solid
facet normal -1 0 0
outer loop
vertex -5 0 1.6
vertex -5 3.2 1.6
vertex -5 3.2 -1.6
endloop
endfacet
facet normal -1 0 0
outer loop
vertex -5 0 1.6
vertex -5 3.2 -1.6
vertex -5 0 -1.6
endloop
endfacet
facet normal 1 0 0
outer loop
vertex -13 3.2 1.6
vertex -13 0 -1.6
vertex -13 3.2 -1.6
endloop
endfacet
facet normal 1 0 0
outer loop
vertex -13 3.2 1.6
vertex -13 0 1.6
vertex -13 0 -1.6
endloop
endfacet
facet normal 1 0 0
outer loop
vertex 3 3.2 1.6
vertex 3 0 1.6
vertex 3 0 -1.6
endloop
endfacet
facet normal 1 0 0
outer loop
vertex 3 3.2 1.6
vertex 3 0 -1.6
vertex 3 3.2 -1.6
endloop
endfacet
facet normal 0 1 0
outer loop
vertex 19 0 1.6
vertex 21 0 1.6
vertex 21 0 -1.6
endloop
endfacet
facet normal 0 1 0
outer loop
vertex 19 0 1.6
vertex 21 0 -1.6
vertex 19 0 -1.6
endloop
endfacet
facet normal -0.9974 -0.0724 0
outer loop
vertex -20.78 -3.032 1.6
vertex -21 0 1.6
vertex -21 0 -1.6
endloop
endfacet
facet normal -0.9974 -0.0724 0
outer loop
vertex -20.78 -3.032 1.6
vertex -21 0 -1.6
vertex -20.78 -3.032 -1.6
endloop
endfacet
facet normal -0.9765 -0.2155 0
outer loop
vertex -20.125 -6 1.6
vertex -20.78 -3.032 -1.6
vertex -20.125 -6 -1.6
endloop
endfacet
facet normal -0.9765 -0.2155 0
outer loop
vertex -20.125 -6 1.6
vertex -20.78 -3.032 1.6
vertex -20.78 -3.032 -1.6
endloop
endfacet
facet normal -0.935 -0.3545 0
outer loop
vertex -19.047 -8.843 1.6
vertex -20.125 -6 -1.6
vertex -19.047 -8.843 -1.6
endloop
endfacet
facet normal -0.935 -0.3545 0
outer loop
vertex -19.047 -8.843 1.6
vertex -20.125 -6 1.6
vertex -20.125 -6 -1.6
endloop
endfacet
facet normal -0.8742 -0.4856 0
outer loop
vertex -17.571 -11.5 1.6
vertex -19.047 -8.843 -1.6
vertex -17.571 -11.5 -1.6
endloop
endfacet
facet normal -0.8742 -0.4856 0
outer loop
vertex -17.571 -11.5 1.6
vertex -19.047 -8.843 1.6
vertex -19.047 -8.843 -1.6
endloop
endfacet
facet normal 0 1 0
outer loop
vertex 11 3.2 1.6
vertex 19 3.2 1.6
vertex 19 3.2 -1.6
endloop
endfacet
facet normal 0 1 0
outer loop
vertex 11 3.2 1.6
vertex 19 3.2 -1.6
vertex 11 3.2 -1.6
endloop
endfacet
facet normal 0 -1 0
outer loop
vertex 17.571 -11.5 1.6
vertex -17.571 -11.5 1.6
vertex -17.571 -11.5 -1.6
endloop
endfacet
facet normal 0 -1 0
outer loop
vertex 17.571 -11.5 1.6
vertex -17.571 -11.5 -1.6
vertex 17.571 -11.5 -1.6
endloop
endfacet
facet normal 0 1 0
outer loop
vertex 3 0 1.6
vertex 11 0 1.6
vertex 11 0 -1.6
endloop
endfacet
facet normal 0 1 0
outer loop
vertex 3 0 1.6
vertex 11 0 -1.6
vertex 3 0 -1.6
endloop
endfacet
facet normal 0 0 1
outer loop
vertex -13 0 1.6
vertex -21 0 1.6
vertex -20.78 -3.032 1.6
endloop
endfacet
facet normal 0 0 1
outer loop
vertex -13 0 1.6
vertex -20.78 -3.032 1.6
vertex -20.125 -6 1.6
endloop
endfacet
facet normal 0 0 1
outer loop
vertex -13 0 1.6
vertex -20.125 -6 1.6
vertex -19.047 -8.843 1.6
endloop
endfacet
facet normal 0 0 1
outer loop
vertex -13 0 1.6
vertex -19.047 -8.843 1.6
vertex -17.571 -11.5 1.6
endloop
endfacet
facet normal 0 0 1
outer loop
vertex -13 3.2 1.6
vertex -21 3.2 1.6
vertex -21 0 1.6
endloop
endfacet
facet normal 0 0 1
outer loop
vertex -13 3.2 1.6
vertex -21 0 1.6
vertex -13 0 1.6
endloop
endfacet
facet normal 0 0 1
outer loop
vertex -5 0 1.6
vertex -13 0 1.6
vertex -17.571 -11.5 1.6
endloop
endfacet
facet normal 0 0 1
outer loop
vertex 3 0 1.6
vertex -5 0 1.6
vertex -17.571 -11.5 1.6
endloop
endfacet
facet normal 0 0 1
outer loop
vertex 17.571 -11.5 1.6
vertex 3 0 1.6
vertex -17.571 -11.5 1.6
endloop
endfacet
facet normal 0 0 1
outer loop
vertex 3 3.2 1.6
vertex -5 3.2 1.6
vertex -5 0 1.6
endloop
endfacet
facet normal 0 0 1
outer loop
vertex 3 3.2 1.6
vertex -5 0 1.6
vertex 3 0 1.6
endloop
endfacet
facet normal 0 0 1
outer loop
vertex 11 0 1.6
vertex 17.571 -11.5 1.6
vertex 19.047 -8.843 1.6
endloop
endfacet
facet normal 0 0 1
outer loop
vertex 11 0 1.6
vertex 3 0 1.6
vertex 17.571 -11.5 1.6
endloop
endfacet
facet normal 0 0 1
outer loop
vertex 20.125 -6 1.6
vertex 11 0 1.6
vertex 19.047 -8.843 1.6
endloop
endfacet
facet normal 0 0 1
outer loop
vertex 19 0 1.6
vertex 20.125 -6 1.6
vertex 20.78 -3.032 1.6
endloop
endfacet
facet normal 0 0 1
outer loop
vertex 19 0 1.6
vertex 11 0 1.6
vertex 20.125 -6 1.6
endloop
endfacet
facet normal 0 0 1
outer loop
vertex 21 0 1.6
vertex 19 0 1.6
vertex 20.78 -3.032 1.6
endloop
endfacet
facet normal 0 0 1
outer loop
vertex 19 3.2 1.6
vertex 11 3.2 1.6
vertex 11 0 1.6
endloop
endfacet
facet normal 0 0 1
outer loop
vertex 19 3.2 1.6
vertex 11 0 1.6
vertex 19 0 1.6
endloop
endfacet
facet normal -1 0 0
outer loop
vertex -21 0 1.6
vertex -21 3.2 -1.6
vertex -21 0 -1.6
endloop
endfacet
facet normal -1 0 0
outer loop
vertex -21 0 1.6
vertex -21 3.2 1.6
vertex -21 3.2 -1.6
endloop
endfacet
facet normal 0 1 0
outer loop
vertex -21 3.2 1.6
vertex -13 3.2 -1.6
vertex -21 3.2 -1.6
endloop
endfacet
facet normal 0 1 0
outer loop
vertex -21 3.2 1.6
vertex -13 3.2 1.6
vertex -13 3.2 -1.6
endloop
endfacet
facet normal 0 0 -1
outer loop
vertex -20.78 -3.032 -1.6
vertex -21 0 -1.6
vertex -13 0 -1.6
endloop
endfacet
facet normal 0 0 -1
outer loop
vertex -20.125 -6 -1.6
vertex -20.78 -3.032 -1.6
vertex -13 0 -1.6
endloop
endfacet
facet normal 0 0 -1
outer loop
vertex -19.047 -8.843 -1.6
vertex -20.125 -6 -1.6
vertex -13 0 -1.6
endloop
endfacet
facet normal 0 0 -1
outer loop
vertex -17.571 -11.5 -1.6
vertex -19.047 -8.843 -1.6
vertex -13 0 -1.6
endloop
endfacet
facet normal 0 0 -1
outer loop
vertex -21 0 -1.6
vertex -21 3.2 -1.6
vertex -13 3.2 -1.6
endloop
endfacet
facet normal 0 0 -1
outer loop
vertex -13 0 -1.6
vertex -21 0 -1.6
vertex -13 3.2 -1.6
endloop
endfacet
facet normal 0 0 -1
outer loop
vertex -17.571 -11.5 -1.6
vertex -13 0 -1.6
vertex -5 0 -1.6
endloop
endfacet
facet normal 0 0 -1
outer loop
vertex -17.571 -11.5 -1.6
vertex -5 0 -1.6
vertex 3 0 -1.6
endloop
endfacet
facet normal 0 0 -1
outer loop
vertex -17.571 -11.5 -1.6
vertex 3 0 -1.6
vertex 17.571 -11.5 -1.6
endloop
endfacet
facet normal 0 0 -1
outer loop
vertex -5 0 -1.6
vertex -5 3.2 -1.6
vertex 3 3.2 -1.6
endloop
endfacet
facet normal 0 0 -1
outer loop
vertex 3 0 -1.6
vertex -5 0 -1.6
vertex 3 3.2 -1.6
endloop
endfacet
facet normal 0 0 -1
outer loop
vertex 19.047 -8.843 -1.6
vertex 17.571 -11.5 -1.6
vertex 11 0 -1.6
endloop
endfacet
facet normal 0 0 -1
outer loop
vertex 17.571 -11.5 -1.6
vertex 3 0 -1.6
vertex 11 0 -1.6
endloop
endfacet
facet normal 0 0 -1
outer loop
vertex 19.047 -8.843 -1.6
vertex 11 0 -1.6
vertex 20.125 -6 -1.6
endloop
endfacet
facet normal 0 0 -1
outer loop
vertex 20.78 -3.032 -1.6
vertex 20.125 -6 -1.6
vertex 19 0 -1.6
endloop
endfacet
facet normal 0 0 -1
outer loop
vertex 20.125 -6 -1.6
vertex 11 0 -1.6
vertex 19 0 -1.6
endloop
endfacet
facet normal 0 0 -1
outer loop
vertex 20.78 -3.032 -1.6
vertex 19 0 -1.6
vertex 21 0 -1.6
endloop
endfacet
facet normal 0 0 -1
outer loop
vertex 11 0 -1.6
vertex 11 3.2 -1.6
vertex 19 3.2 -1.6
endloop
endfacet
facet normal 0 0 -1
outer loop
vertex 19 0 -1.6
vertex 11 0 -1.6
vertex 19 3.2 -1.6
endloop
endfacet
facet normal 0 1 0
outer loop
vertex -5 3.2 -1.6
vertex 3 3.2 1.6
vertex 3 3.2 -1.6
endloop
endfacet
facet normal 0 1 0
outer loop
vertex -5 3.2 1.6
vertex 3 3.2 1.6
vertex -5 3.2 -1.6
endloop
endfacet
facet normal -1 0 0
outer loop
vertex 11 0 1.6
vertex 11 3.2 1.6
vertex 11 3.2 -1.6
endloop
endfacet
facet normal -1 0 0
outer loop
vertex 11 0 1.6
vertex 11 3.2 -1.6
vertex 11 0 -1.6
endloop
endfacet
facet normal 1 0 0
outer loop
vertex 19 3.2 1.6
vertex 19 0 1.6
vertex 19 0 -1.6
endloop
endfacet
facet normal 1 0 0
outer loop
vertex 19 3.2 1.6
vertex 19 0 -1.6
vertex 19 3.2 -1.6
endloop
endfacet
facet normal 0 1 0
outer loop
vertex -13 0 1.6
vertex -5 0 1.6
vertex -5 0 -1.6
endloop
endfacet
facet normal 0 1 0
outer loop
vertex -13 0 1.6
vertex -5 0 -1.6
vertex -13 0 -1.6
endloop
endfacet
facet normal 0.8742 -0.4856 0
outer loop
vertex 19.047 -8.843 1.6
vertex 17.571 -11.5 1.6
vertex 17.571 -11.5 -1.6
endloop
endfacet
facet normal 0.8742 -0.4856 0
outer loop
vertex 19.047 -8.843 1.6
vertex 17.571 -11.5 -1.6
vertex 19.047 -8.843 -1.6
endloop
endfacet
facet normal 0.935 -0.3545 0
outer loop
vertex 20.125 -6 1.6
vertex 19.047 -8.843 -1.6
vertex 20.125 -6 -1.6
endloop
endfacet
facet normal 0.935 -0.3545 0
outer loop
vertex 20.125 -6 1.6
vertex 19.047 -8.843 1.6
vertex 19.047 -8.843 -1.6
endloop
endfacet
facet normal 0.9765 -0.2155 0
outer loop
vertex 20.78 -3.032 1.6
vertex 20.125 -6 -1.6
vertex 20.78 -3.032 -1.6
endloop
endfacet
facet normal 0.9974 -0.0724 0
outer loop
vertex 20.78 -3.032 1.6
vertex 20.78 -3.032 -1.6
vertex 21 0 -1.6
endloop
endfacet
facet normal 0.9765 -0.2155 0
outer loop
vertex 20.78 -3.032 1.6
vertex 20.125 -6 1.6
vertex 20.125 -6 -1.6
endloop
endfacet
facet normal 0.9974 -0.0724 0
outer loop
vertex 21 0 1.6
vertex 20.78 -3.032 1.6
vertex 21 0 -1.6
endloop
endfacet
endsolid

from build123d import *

# Parameters (mm, degrees)
F1_DEPTH = 1.6


# Not quite as in the source:
# - a feature names something its author has since deleted; it is built from what else it names


with BuildPart() as f1:
    # F0 (on Top) → F1 (new body, symmetric)
    with BuildSketch(Plane.XY):
        with BuildLine():
            Line((-21, 3.2), (-21, 0))
            ThreePointArc((-21, 0), (-20.1245739235, -6.0001270317), (-17.5712833908, -11.5))
            Line((-17.5712833908, -11.5), (0, -11.5))
            Line((0, -11.5), (17.5712833908, -11.5))
            ThreePointArc((17.5712833908, -11.5), (20.1245739235, -6.0001270317), (21, 0))
            Line((21, 0), (19, 0))
            Line((19, 0), (19, 3.2))
            Line((19, 3.2), (11, 3.2))
            Line((11, 3.2), (11, 0))
            Line((11, 0), (3, 0))
            Line((3, 0), (3, 3.2))
            Line((3, 3.2), (-5, 3.2))
            Line((-5, 3.2), (-5, 0))
            Line((-5, 0), (-13, 0))
            Line((-13, 0), (-13, 3.2))
            Line((-13, 3.2), (-21, 3.2))
        make_face()
    extrude(amount=F1_DEPTH, both=True)


solid = f1.part
